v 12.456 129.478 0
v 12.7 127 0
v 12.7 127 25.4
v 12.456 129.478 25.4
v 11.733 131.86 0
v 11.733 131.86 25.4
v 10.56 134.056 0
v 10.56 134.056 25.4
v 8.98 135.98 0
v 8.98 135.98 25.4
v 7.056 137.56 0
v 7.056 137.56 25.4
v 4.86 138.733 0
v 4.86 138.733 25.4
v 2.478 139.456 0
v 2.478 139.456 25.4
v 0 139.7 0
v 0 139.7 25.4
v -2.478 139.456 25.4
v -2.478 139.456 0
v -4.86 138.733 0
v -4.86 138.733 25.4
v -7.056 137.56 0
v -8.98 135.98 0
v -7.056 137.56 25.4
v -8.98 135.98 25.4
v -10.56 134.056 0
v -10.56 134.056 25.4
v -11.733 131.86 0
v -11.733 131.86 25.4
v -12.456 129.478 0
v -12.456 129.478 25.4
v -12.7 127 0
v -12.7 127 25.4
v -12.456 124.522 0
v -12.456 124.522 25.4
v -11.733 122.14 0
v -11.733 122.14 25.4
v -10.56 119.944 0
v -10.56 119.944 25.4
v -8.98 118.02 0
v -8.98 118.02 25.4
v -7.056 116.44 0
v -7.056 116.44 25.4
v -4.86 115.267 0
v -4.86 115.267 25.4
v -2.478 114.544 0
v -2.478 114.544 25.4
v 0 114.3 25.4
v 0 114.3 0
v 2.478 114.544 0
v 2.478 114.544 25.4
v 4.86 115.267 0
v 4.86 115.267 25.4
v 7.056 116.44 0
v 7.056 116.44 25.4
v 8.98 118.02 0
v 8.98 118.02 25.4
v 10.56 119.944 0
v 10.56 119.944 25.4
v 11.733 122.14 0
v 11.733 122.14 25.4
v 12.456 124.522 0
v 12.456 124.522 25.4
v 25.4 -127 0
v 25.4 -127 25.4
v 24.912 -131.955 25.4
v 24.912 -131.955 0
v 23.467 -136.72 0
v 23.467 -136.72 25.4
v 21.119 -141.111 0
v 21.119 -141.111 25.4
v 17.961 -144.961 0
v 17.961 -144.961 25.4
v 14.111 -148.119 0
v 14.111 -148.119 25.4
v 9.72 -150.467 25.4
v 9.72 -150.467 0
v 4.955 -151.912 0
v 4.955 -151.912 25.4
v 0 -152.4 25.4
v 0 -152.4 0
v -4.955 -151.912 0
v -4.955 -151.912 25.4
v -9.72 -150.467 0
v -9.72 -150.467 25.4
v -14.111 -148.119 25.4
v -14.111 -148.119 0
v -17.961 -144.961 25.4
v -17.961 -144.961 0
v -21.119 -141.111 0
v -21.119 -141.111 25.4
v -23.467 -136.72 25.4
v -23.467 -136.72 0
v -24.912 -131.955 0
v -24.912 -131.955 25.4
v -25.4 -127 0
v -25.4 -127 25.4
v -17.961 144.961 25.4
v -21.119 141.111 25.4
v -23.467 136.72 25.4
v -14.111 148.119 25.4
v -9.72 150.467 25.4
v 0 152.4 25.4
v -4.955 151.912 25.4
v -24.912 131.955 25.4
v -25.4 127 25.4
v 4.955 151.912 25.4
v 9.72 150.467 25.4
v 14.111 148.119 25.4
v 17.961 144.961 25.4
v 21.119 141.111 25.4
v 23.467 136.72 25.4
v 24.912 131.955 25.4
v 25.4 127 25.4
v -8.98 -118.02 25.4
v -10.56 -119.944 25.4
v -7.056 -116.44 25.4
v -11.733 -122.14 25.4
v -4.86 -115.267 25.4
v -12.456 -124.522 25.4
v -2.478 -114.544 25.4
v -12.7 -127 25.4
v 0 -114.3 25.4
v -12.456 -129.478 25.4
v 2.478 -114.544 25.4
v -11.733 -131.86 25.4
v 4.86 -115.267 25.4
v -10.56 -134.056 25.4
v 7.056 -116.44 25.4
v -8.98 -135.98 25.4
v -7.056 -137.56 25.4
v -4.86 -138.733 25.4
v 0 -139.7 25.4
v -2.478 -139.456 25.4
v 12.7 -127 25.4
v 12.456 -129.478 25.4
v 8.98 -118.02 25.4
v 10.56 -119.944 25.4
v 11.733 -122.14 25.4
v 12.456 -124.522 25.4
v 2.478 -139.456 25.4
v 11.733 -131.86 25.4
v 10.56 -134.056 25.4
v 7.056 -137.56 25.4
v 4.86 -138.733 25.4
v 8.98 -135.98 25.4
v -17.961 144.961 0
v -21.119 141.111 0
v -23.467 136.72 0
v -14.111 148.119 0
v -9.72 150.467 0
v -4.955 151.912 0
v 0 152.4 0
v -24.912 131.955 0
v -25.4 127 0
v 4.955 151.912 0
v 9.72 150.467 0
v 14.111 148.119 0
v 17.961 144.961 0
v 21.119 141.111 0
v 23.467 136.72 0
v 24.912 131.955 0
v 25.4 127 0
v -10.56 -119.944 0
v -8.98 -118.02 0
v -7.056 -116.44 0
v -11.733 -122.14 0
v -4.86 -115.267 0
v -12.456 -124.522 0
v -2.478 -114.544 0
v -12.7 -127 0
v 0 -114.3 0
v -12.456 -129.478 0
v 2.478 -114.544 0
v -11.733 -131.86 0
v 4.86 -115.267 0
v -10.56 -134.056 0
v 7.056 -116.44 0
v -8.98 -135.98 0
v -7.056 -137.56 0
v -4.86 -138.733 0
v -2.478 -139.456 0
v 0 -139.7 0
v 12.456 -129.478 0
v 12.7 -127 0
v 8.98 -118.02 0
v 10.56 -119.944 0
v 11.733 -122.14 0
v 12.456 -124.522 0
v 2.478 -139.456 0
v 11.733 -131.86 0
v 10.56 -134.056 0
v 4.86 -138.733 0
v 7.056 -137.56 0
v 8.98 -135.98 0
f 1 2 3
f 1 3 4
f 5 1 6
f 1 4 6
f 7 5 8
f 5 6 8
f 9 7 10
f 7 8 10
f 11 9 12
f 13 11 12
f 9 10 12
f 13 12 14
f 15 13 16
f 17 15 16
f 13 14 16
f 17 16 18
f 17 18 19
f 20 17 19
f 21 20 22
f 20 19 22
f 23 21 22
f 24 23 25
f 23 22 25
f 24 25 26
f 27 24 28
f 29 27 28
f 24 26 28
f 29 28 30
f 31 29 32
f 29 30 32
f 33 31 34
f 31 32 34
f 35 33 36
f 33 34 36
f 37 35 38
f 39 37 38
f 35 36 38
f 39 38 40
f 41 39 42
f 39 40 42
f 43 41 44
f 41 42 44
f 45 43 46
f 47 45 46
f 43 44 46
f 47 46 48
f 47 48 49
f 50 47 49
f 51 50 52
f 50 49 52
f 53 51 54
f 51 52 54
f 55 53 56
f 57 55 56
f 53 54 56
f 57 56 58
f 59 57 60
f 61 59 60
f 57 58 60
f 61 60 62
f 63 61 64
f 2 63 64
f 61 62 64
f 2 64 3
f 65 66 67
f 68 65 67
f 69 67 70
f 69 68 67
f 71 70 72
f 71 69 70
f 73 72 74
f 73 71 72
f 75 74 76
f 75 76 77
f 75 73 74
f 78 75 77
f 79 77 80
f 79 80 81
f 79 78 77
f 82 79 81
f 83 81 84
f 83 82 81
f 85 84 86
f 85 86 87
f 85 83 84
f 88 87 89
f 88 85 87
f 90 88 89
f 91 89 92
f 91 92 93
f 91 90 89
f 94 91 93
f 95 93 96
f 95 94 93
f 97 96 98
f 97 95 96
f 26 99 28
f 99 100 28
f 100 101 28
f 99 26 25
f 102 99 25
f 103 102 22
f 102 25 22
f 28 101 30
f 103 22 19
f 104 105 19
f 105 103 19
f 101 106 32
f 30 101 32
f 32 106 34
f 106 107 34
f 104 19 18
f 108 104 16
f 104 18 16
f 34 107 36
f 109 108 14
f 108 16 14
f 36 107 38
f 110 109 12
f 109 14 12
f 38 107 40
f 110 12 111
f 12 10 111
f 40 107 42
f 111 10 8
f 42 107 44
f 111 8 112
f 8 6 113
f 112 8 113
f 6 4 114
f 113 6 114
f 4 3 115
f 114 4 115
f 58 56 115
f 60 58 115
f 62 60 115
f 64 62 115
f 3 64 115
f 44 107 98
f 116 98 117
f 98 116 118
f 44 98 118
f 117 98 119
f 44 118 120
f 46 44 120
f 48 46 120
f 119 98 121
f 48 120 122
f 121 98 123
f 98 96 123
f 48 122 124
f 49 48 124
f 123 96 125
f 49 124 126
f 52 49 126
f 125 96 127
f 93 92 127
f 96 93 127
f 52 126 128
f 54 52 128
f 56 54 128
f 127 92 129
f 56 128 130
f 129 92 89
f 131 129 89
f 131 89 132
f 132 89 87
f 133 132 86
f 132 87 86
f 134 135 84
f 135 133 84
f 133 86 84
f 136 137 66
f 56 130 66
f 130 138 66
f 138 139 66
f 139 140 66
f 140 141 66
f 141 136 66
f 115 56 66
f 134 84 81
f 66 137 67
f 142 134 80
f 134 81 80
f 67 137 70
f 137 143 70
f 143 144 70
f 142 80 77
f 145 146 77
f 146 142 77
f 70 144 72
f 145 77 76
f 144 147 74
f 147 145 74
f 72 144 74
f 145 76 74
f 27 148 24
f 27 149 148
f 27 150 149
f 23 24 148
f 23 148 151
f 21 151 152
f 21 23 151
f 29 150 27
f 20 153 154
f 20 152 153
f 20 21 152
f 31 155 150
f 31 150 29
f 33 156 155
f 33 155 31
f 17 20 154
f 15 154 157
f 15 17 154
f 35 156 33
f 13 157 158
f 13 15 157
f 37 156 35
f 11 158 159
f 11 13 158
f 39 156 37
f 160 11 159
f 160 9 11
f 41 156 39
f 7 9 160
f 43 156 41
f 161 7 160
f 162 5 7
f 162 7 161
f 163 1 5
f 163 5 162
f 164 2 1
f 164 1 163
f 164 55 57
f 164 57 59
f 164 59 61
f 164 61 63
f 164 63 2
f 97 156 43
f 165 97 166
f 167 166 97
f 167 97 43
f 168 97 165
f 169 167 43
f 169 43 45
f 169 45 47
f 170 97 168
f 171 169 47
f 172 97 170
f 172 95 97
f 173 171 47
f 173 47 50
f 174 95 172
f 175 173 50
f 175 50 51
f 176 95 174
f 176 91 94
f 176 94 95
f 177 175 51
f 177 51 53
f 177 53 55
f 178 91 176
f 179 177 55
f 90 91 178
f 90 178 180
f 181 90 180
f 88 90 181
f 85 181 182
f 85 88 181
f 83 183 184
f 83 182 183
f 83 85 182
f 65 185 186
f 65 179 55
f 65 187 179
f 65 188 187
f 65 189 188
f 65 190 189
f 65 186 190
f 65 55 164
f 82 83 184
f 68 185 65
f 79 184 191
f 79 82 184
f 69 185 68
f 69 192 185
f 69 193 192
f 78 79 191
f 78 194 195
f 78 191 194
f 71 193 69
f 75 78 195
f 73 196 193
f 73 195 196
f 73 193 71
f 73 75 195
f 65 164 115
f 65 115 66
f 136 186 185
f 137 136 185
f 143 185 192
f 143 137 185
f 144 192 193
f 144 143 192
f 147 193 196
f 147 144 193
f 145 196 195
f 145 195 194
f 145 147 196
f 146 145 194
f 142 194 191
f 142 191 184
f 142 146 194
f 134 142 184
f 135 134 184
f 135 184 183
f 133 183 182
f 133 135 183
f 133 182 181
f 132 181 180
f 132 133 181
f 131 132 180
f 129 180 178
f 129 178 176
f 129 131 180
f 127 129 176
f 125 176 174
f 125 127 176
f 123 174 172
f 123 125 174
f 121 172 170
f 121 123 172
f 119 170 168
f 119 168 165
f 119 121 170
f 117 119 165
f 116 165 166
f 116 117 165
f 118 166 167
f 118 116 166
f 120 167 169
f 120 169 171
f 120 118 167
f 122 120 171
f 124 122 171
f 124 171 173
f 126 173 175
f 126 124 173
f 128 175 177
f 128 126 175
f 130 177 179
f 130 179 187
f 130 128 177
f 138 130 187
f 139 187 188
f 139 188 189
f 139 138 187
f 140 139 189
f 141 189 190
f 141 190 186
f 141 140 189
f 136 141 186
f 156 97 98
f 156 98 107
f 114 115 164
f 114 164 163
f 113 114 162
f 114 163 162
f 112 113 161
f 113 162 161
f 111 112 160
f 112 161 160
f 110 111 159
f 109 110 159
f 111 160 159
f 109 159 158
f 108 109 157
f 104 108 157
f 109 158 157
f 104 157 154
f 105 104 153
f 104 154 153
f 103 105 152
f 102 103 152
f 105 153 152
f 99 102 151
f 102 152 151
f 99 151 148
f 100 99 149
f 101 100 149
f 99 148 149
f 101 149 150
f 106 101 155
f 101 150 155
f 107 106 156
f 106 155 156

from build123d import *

# Parameters (mm, degrees)
F1_DEPTH = 25.4
F2_R     = 12.7
F3_DEPTH = 25.4


with BuildPart() as f1:
    # F0 (on Top) → F1 (new body)
    with BuildSketch(Plane.XY):
        with BuildLine():
            Line((-25.4, 127), (-25.4, 0))
            Line((-25.4, 0), (25.4, 0))
            Line((25.4, 0), (25.4, 127))
            ThreePointArc((25.4, 127), (0, 101.6), (-25.4, 127))
        make_face()
        with BuildLine():
            ThreePointArc((25.4, 127), (0, 152.4), (-25.4, 127))
            Line((-25.4, 127), (25.4, 127))
        make_face()
        with BuildLine():
            Line((25.4, 127), (-25.4, 127))
            ThreePointArc((-25.4, 127), (0, 101.6), (25.4, 127))
        make_face()
    extrude(amount=F1_DEPTH)

    # F2 (on face) → F3 (cut)
    with BuildSketch(Plane.XY.offset(25.4)):
        with Locations((0, 127)):
            Circle(F2_R)
    extrude(amount=-F3_DEPTH, mode=Mode.SUBTRACT)

    # F4: F1 across face


with BuildPart() as f1_1:
    add(f1.part)
    add(f1.part.mirror(Plane(origin=(0, 0, 12.7), x_dir=(1, 0, 0), z_dir=(0, -1, 0))))


solid = f1_1.part
